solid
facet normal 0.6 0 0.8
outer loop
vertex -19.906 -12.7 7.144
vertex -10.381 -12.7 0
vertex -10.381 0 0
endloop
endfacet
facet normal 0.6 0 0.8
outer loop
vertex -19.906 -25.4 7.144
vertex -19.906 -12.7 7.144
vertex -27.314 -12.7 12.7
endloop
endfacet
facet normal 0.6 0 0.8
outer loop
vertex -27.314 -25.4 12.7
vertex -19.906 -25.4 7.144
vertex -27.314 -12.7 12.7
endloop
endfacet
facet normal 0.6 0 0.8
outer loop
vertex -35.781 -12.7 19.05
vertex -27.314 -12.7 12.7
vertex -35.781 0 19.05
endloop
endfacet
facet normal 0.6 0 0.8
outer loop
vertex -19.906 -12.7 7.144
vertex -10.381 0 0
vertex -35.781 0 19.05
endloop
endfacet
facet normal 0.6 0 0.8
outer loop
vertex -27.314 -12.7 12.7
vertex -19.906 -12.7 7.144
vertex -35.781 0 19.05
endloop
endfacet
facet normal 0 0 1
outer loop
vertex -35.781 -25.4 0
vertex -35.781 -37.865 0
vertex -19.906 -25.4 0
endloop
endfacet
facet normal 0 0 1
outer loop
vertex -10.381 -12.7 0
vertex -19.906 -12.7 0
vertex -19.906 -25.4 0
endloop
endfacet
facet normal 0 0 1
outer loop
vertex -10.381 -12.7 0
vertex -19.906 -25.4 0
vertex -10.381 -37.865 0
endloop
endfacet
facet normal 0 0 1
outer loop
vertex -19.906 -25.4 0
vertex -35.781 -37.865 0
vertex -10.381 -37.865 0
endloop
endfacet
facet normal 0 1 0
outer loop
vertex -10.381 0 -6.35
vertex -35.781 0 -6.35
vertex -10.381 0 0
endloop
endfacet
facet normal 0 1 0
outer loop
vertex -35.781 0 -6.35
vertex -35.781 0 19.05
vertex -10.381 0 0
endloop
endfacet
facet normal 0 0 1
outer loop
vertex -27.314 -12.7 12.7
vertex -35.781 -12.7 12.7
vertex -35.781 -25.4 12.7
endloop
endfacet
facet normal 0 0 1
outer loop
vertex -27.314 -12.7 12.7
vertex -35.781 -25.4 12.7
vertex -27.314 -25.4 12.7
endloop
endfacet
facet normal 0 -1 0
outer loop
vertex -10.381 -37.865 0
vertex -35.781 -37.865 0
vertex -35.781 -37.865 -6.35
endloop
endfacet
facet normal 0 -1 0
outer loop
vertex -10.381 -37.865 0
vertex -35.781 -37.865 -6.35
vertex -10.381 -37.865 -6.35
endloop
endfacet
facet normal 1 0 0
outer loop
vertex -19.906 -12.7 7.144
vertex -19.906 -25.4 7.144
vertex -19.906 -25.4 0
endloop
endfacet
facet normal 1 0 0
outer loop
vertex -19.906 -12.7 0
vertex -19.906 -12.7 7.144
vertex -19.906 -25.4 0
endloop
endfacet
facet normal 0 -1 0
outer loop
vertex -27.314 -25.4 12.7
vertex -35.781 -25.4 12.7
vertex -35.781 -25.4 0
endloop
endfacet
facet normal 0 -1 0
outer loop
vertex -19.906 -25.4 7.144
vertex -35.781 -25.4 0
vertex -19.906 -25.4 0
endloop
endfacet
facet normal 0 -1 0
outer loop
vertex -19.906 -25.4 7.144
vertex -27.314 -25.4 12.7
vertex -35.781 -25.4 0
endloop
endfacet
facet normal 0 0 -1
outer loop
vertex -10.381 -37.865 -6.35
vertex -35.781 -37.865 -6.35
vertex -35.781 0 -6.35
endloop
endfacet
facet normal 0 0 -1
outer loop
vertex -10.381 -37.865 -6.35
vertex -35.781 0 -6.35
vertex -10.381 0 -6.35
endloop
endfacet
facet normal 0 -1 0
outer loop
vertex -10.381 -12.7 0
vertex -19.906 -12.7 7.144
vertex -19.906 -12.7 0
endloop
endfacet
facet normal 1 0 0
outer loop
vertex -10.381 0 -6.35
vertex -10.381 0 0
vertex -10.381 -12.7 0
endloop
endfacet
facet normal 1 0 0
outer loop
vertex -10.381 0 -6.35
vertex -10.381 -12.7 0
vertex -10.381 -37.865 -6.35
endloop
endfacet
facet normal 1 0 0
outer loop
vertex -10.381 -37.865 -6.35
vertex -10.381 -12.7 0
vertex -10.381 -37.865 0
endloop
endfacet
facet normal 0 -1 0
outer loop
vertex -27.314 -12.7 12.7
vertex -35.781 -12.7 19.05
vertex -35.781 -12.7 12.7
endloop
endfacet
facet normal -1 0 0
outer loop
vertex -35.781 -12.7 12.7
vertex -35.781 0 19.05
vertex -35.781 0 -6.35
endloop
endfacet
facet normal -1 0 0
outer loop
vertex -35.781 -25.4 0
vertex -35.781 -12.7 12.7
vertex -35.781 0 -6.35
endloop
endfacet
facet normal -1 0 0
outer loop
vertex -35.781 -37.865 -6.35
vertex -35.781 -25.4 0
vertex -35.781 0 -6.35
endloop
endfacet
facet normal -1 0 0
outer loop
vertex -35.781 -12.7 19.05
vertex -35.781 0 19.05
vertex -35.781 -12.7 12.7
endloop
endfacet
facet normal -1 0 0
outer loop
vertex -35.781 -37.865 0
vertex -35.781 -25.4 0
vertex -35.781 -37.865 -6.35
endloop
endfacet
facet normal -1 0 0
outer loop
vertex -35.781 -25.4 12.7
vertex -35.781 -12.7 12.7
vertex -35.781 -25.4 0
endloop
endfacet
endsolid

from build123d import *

# Parameters (mm, degrees)
F1_DEPTH = 25.4
F2_W     = 25.4
F2_H     = 37.8646999598
F3_DEPTH = 6.35
F5_DEPTH = 12.7
F7_DEPTH = 12.7


with BuildPart() as f1:
    # F0 (on Front) → F1 (new body)
    with BuildSketch(Plane.XZ):
        Polygon((-35.7808704906, 19.05), (-35.7808704906, 0), (-10.3808704906, 0), align=None)
    extrude(amount=F1_DEPTH)

    # F2 (on face) → F3 (join)
    with BuildSketch(Plane(origin=(0, 0, 0), x_dir=(1, 0, 0), z_dir=(0, 0, -1))):
        with Locations((-23.0808704906, 18.9323499799)):
            Rectangle(F2_W, F2_H)
    extrude(amount=F3_DEPTH)

    # F4 (on face) → F5 (cut)
    with BuildSketch(Plane.XZ.offset(25.4)):
        Polygon((-10.3808704906, 0), (-19.9058704906, 7.14375), (-19.9058704906, 0), align=None)
    extrude(amount=-F5_DEPTH, mode=Mode.SUBTRACT)

    # F6 (on face) → F7 (cut)
    with BuildSketch(Plane.XZ.offset(25.4)):
        Polygon((-35.7808704906, 19.05), (-35.7808704906, 12.7), (-27.3142038239, 12.7), align=None)
    extrude(amount=-F7_DEPTH, mode=Mode.SUBTRACT)


solid = f1.part
